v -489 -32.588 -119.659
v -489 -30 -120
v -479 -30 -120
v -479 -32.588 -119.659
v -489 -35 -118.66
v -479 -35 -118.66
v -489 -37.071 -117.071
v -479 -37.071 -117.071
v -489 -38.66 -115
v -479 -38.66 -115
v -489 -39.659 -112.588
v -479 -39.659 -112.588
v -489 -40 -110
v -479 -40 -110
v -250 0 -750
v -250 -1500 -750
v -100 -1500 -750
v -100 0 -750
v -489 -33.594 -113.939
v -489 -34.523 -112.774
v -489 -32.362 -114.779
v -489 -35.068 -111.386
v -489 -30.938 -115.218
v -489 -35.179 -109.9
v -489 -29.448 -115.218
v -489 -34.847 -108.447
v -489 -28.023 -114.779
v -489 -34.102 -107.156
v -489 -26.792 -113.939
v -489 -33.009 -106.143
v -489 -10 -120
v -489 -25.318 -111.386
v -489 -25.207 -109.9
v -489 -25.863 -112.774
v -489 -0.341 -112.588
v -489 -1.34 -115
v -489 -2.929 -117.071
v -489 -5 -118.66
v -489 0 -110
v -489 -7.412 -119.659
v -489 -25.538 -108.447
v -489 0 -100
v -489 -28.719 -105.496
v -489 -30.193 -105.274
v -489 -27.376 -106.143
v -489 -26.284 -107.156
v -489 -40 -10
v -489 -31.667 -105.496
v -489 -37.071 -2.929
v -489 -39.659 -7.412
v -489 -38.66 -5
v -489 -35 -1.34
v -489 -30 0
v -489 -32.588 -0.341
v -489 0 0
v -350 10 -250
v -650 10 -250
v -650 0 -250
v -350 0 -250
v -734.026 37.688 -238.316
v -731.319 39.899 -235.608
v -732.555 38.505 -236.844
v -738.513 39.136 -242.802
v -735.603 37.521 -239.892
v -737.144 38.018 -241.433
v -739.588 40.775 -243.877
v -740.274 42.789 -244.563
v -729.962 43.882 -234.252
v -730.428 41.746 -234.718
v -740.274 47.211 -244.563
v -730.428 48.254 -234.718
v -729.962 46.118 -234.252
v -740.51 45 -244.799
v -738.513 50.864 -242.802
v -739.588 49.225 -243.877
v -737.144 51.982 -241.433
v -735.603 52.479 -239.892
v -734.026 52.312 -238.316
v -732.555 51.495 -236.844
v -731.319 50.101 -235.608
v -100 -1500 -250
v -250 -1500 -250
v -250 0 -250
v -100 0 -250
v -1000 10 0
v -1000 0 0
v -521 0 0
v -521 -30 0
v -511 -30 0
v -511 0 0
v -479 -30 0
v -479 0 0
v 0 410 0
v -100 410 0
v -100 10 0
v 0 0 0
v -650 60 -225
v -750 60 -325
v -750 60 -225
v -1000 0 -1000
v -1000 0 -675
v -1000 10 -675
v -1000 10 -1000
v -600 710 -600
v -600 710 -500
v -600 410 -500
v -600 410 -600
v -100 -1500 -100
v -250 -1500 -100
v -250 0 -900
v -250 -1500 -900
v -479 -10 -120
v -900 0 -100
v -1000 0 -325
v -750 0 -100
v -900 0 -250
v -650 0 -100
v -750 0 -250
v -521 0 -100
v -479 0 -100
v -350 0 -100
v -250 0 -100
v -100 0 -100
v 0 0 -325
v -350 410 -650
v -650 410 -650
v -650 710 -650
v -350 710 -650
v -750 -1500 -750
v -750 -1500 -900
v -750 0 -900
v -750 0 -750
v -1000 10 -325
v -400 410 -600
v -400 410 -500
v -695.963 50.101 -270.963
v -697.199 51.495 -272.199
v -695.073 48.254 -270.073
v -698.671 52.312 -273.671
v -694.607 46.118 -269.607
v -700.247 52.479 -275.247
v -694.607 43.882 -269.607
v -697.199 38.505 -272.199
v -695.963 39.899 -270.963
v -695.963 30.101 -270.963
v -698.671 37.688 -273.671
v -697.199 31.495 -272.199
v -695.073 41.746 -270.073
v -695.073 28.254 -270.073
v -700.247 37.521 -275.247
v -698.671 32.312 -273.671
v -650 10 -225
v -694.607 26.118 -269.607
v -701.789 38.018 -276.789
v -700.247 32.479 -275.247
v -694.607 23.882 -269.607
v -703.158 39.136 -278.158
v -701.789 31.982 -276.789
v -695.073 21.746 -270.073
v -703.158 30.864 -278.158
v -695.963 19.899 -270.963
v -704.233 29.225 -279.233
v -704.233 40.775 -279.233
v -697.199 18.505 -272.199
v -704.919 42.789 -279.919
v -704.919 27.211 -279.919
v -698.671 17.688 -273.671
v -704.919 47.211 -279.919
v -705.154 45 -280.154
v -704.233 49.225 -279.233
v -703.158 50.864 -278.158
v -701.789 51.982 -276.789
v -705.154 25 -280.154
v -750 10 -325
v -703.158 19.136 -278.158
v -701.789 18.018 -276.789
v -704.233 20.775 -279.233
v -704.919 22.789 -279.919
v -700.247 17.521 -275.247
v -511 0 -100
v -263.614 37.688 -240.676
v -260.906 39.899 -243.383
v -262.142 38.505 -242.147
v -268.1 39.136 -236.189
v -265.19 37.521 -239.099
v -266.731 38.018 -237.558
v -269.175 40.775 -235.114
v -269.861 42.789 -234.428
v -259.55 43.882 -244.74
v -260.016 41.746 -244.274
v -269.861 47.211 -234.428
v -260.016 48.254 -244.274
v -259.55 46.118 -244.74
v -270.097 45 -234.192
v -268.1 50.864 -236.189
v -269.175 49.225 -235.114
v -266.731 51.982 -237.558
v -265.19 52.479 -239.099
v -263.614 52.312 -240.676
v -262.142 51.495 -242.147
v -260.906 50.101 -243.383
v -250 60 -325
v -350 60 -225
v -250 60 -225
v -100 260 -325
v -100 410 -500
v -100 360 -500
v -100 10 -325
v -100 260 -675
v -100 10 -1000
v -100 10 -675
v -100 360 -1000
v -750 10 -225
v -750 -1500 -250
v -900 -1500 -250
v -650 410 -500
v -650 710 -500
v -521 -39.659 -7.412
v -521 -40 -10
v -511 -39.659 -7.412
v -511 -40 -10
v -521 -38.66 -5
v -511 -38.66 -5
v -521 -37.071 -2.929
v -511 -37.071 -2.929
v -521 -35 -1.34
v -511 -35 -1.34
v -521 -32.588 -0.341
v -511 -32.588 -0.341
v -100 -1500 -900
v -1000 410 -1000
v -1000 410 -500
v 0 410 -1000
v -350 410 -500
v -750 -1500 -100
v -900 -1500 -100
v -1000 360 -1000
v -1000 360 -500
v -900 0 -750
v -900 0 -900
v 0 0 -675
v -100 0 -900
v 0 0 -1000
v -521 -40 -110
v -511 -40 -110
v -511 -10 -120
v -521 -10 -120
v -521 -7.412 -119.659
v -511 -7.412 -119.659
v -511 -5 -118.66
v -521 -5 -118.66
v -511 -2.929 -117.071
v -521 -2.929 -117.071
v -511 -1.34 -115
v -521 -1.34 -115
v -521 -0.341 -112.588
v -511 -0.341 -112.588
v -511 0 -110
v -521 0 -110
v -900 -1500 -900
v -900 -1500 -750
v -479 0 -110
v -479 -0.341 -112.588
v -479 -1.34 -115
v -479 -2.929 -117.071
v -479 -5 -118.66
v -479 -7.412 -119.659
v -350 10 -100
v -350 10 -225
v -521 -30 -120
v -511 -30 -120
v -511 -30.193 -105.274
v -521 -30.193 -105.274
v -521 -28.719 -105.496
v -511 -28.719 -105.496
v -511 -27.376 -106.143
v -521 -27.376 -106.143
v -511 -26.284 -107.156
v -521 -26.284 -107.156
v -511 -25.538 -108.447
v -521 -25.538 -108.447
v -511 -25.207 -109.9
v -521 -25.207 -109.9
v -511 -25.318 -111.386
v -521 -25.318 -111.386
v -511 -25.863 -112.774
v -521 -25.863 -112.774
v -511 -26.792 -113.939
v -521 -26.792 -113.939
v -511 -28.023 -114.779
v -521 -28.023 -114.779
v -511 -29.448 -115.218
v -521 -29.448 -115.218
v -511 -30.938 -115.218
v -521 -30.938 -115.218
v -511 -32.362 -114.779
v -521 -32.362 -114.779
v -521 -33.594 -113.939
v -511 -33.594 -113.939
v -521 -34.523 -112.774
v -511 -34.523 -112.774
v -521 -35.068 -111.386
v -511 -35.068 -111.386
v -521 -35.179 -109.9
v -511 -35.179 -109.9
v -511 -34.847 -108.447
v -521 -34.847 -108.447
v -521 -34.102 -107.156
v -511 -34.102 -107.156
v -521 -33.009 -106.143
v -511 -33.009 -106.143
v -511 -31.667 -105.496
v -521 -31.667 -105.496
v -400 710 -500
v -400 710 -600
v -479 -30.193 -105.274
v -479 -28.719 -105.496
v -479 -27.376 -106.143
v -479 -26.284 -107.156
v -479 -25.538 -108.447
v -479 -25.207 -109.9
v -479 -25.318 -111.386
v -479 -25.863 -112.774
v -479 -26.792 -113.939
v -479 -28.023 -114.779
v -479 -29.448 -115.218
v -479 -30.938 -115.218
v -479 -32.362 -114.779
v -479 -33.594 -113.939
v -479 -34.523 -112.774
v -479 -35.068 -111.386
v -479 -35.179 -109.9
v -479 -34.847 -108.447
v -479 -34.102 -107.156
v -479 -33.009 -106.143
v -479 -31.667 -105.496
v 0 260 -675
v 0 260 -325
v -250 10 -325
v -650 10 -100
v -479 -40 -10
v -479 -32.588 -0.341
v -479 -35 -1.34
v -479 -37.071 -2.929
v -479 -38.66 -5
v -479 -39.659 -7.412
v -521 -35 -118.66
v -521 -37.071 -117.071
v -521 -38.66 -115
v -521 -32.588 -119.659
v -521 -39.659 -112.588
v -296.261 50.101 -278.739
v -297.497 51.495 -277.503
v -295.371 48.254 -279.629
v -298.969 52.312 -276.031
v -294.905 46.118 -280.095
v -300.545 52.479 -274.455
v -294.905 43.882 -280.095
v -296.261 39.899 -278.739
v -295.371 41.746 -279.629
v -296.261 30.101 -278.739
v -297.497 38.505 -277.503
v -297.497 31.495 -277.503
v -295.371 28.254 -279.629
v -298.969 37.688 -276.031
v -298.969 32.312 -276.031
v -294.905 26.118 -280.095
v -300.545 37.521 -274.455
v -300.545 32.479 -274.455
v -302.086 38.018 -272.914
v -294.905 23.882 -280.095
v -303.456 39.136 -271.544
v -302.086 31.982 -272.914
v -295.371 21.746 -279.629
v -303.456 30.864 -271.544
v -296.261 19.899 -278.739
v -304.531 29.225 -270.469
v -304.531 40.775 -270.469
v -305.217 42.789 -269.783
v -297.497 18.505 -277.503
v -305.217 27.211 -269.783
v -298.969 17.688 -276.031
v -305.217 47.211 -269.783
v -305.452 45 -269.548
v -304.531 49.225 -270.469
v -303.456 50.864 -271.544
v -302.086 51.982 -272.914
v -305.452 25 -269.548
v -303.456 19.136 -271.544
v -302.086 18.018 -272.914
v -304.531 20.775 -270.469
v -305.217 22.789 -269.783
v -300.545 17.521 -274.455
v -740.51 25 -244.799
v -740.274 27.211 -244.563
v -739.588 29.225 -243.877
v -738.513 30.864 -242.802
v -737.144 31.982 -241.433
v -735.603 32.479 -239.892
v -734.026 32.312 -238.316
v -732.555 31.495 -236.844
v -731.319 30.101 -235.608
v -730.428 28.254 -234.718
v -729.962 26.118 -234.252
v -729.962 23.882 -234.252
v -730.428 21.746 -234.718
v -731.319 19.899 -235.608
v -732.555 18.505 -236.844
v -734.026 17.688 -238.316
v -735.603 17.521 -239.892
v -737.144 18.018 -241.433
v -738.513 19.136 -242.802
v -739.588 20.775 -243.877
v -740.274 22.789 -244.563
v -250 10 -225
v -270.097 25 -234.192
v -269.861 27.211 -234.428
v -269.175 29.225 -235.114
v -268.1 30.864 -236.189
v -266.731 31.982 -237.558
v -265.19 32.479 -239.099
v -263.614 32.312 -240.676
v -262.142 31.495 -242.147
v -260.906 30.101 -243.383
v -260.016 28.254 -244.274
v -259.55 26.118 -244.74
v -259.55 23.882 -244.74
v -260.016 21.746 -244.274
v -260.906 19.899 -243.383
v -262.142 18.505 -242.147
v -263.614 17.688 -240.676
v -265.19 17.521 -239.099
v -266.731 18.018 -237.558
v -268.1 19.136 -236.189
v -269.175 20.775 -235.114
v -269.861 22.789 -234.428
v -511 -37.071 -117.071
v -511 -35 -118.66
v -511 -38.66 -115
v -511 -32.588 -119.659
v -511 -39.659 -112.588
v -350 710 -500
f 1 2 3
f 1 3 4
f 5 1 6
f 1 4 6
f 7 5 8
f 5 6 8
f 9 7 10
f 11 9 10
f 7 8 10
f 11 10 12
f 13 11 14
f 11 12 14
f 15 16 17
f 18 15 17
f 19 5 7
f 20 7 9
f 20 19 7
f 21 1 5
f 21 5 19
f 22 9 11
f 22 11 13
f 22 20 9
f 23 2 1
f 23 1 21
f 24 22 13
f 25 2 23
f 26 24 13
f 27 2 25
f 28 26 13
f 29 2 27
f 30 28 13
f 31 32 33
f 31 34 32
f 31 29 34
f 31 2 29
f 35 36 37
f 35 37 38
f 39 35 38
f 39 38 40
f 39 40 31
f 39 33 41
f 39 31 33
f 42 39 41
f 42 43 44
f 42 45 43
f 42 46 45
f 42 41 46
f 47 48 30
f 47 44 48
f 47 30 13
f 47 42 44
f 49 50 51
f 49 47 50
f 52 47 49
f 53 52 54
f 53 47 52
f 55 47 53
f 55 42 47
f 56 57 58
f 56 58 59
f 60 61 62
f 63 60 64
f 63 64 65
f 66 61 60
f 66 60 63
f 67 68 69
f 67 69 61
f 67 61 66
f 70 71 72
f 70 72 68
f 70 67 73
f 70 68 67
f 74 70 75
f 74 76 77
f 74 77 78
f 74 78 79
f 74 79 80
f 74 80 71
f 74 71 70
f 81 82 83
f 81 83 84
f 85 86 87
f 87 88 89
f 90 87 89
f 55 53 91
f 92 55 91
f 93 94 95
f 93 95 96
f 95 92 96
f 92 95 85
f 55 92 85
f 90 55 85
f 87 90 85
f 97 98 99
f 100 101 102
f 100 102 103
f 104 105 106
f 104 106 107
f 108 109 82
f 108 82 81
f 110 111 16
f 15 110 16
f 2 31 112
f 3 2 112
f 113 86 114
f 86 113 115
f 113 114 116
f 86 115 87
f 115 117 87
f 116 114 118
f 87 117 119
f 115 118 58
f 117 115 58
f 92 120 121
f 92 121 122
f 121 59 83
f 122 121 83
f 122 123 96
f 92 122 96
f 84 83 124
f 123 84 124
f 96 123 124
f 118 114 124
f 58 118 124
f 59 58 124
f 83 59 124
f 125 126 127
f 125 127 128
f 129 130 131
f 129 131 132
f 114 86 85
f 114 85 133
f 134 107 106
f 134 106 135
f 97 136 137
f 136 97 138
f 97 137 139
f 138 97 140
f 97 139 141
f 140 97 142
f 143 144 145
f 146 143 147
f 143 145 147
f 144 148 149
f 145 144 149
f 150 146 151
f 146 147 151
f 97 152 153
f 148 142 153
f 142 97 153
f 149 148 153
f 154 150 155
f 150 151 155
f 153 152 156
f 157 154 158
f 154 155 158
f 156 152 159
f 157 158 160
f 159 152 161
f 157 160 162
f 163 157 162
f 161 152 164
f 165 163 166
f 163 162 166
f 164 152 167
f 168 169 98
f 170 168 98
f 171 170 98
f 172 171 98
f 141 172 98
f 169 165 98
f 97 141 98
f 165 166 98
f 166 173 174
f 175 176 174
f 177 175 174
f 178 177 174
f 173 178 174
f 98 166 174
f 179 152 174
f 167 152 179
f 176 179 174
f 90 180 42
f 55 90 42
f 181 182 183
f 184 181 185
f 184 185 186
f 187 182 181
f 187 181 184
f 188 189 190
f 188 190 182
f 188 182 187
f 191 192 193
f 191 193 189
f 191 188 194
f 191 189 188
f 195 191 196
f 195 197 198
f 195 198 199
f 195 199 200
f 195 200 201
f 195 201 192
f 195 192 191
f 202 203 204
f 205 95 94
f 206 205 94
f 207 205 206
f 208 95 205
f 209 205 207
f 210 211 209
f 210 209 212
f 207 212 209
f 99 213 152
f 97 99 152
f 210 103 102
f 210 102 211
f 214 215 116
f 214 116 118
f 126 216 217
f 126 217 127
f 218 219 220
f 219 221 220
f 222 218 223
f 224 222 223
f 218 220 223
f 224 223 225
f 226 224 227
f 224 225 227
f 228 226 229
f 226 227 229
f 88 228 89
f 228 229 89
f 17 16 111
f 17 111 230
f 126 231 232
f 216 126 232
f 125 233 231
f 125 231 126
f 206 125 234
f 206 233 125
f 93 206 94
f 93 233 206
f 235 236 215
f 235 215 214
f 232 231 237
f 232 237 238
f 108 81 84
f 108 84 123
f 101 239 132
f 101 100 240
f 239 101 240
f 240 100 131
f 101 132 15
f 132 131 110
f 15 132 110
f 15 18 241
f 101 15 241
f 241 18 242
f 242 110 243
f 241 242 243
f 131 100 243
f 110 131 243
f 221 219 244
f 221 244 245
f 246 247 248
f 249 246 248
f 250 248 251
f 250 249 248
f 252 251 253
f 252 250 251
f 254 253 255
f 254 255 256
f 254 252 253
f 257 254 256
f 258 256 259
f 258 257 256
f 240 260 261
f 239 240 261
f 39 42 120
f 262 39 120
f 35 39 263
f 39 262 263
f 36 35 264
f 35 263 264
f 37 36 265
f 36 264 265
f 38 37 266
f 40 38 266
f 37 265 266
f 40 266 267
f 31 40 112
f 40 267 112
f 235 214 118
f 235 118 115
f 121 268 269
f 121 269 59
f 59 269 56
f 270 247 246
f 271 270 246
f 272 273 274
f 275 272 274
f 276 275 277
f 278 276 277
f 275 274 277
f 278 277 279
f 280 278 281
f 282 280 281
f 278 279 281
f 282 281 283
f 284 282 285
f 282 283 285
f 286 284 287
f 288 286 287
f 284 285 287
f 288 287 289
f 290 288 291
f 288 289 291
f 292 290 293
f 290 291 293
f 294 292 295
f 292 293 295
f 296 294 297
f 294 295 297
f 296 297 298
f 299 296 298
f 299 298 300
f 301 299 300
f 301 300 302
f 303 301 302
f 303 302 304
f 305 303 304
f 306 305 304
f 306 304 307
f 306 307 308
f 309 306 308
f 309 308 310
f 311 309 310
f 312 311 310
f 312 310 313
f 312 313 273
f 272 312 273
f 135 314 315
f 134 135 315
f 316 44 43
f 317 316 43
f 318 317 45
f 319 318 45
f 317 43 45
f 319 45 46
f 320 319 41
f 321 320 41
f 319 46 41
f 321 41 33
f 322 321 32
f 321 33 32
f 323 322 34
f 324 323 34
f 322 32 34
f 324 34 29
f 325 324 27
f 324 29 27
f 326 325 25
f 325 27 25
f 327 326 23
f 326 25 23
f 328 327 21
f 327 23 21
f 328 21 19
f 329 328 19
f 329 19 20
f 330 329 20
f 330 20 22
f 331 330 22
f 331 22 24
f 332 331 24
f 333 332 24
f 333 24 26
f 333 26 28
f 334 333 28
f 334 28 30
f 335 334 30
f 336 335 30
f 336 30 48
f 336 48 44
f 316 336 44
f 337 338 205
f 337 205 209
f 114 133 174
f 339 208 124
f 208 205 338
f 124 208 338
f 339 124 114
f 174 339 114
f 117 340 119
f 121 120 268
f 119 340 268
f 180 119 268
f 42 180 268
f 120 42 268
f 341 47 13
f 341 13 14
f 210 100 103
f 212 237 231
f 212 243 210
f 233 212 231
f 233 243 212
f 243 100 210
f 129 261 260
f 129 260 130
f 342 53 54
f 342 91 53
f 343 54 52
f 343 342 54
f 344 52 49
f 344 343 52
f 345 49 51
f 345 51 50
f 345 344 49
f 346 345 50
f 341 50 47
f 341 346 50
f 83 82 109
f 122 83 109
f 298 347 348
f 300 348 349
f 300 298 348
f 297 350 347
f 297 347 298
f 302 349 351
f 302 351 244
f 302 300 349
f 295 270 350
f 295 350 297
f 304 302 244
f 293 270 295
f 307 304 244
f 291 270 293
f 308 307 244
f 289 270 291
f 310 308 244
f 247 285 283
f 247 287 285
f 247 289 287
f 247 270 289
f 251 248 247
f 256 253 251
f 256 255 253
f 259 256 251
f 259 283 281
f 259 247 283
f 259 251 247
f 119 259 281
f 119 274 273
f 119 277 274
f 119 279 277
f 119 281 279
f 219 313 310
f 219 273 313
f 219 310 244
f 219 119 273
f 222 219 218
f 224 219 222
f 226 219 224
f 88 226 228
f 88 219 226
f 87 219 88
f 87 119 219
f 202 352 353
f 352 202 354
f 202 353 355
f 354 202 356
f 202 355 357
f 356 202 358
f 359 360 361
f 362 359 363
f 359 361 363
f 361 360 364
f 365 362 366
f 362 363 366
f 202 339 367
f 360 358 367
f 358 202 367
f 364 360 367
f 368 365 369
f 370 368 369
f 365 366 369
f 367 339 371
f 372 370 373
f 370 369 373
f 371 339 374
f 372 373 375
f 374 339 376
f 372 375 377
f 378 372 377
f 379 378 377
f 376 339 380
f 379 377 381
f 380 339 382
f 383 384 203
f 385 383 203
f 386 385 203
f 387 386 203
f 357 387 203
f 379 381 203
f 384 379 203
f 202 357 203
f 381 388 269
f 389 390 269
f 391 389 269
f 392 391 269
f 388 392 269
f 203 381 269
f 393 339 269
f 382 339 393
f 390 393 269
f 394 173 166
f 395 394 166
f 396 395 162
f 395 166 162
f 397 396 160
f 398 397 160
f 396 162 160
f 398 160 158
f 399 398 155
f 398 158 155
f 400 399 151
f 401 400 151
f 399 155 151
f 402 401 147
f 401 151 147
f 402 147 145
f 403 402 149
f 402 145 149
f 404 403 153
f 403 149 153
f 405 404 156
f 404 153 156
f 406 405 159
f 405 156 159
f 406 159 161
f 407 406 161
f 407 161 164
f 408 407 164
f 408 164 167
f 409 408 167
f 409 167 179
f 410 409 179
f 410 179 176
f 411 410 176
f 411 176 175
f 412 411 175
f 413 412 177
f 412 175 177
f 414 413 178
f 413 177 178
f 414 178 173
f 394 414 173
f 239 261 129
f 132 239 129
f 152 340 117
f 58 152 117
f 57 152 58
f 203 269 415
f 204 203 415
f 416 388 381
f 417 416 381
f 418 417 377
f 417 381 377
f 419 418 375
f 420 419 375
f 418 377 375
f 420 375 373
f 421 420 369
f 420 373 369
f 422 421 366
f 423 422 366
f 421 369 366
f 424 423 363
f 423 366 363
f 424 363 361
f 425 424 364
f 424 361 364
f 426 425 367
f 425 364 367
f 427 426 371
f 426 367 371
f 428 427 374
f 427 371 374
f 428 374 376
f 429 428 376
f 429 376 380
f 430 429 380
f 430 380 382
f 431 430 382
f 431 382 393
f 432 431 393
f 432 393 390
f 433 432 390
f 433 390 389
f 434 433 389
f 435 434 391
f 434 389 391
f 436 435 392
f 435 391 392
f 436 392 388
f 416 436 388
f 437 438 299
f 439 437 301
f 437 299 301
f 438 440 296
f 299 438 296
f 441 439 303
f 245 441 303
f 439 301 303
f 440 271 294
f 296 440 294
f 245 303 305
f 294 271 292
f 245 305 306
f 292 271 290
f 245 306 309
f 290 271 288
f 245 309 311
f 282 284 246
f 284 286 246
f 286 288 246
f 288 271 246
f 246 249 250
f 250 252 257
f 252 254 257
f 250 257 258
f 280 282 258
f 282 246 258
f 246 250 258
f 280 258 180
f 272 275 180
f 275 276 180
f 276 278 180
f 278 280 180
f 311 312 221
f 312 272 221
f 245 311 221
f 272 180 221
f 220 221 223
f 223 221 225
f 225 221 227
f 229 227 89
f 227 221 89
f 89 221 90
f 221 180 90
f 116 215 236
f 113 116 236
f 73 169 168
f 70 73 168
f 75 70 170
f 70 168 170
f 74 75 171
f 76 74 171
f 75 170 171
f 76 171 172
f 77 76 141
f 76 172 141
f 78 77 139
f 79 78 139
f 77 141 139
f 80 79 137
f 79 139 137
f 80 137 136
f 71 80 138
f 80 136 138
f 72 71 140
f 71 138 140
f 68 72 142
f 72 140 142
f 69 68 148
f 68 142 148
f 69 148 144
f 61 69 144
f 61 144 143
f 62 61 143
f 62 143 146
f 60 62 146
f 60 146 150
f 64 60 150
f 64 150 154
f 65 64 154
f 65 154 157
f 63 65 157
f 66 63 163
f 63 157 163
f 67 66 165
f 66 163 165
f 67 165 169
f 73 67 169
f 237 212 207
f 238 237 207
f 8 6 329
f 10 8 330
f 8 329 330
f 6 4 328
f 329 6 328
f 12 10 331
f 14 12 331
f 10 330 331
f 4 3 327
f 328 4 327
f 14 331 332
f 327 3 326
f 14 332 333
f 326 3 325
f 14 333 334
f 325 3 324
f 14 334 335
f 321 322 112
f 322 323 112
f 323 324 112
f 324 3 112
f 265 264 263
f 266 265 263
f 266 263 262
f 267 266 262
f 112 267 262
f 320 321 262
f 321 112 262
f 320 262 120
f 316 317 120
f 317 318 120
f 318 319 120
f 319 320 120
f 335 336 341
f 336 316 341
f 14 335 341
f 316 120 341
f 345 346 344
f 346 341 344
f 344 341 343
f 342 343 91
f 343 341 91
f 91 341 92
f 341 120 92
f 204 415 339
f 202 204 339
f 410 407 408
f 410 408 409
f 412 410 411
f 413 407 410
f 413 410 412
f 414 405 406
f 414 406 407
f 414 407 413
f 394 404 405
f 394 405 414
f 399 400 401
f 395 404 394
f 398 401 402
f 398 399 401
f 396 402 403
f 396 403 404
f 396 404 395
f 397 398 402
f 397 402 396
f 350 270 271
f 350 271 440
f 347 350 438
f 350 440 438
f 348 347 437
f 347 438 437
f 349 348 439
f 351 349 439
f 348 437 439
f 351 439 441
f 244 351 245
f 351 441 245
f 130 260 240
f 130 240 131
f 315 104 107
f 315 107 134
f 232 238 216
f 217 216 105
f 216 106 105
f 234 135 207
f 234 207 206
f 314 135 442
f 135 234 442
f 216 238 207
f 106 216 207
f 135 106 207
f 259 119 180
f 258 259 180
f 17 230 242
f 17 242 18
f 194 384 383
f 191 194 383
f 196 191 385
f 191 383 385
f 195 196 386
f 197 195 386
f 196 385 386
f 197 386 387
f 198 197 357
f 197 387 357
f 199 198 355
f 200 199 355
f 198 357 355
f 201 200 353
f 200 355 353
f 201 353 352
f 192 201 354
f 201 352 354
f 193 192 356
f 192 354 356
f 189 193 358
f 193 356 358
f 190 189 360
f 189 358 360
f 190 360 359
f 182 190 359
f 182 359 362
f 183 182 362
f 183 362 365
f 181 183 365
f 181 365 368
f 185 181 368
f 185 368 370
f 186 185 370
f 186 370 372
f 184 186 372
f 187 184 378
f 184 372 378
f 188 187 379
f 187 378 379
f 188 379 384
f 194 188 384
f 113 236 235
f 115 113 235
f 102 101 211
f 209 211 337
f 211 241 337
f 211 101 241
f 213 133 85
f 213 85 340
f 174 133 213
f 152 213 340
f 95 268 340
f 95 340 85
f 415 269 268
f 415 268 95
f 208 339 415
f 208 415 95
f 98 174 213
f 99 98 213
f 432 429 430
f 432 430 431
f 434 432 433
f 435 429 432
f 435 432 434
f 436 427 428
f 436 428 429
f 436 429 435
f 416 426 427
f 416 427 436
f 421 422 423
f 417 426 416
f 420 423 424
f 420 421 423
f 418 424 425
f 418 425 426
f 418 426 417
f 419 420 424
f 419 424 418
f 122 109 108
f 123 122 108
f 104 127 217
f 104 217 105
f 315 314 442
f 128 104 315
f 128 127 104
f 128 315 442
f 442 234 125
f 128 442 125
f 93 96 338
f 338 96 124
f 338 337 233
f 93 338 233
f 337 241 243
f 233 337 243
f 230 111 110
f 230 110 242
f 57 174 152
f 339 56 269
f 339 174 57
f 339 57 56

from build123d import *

# Parameters (mm, degrees)
SKETCH1_W           = 1000
SKETCH1_H           = 1000
BOSS_EXTRUDE1_DEPTH = 10
SKETCH5_W           = 150
SKETCH5_H           = 150
BOSS_EXTRUDE2_DEPTH = 1500
SKETCH7_W           = 300
SKETCH7_H           = 150
CUT_EXTRUDE1_DEPTH  = 1500
SKETCH9_W           = 10
SKETCH9_H           = 120
BOSS_EXTRUDE4_DEPTH = 40
FILLET1_R           = 10
FILLET2_R           = 10
SKETCH10_R          = 5
CUT_EXTRUDE3_DEPTH  = 55
SKETCH11_W          = 100
SKETCH11_H          = 1000
BOSS_EXTRUDE5_DEPTH = 400
SKETCH12_W          = 500
SKETCH12_H          = 50
BOSS_EXTRUDE6_DEPTH = 900
SKETCH14_W          = 300
SKETCH14_H          = 150
BOSS_EXTRUDE7_DEPTH = 300
SKETCH15_W          = 200
SKETCH15_H          = 100
CUT_EXTRUDE4_DEPTH  = 300
SKETCH8_W           = 1000
SKETCH8_H           = 350
CUT_EXTRUDE2_DEPTH  = 2069.840254829
SKETCH16_W          = 350
SKETCH16_H          = 250
CUT_EXTRUDE5_DEPTH  = 2062.552812809
BOSS_EXTRUDE8_DEPTH = 50
SKETCH21_R          = 7.5
CUT_EXTRUDE7_DEPTH  = 50
SKETCH22_R          = 7.5
CUT_EXTRUDE8_DEPTH  = 50


with BuildPart() as part:
    # Sketch1 → Boss-Extrude1 (new body)
    with BuildSketch(Plane(origin=(0, 0, 0), x_dir=(1, 0, 0), z_dir=(0, 1, 0))):
        with Locations((-500, 500)):
            Rectangle(SKETCH1_W, SKETCH1_H)
    extrude(amount=BOSS_EXTRUDE1_DEPTH)

    # Sketch5 → Boss-Extrude2 (add)
    with BuildSketch(Plane.XZ):
        with Locations((-825, -825)):
            Rectangle(SKETCH5_W, SKETCH5_H)
        with Locations((-825, -175)):
            Rectangle(SKETCH5_W, SKETCH5_H)
        with Locations((-175, -825)):
            Rectangle(SKETCH5_W, SKETCH5_H)
        with Locations((-175, -175)):
            Rectangle(SKETCH5_W, SKETCH5_H)
    extrude(amount=BOSS_EXTRUDE2_DEPTH)

    # Sketch7 → Cut-Extrude1 (cut)
    with BuildSketch(Plane(origin=(0, 10, 0), x_dir=(1, 0, 0), z_dir=(0, 1, 0))):
        with Locations((-500, 175)):
            Rectangle(SKETCH7_W, SKETCH7_H)
    extrude(amount=-CUT_EXTRUDE1_DEPTH, mode=Mode.SUBTRACT)

    # Sketch9 → Boss-Extrude4 (add)
    with BuildSketch(Plane.XZ):
        with Locations((-516, -60)):
            Rectangle(SKETCH9_W, SKETCH9_H)
        with Locations((-484, -60)):
            Rectangle(SKETCH9_W, SKETCH9_H)
    extrude(amount=BOSS_EXTRUDE4_DEPTH)

    # Fillet1
    fillet1_edges = [part.edges().sort_by_distance(p)[0] for p in [
        (-516, 0, -120),
        (-516, -40, -120),
        (-484, 0, -120),
        (-484, -40, -120),
    ]]
    fillet(fillet1_edges, radius=FILLET1_R)

    # Fillet2
    fillet2_edges = [part.edges().sort_by_distance(p)[0] for p in [
        (-516, -40, 0),
        (-484, -40, 0),
    ]]
    fillet(fillet2_edges, radius=FILLET2_R)

    # Sketch10 → Cut-Extrude3 (cut)
    with BuildSketch(Plane.ZY.offset(521)):
        with Locations((-110.273760932, -30.192862472)):
            Circle(SKETCH10_R)
    extrude(amount=-CUT_EXTRUDE3_DEPTH, mode=Mode.SUBTRACT)

    # Sketch11 → Boss-Extrude5 (add)
    with BuildSketch(Plane(origin=(0, 10, 0), x_dir=(1, 0, 0), z_dir=(0, 1, 0))):
        with Locations((-50, 500)):
            Rectangle(SKETCH11_W, SKETCH11_H)
    extrude(amount=BOSS_EXTRUDE5_DEPTH)

    # Sketch12 → Boss-Extrude6 (add)
    with BuildSketch(Plane.ZY.offset(100)):
        with Locations((-750, 385)):
            Rectangle(SKETCH12_W, SKETCH12_H)
    extrude(amount=BOSS_EXTRUDE6_DEPTH)

    # Sketch14 → Boss-Extrude7 (add)
    with BuildSketch(Plane(origin=(0, 410, 0), x_dir=(1, 0, 0), z_dir=(0, 1, 0))):
        with Locations((-500, 575)):
            Rectangle(SKETCH14_W, SKETCH14_H)
    extrude(amount=BOSS_EXTRUDE7_DEPTH)

    # Sketch15 → Cut-Extrude4 (cut)
    with BuildSketch(Plane(origin=(0, 710, 0), x_dir=(1, 0, 0), z_dir=(0, 1, 0))):
        with Locations((-500, 550)):
            Rectangle(SKETCH15_W, SKETCH15_H)
    extrude(amount=-CUT_EXTRUDE4_DEPTH, mode=Mode.SUBTRACT)

    # Sketch8 → Cut-Extrude2 (cut, through all)
    with BuildSketch(Plane(origin=(0, 10, 0), x_dir=(1, 0, 0), z_dir=(0, 1, 0))):
        with Locations((-500, 500)):
            Rectangle(SKETCH8_W, SKETCH8_H)
    extrude(amount=-CUT_EXTRUDE2_DEPTH, mode=Mode.SUBTRACT)

    # Sketch16 → Cut-Extrude5 (cut, through all)
    with BuildSketch(Plane(origin=(0, 0, 0), x_dir=(0, 0, -1), z_dir=(1, 0, 0))):
        with Locations((500, 135)):
            Rectangle(SKETCH16_W, SKETCH16_H)
    extrude(amount=-CUT_EXTRUDE5_DEPTH, mode=Mode.SUBTRACT)

    # Sketch18 → Boss-Extrude8 (add)
    with BuildSketch(Plane(origin=(0, 10, 0), x_dir=(1, 0, 0), z_dir=(0, 1, 0))):
        Polygon((-750, 325), (-750, 225), (-650, 225), align=None)
        Polygon((-350, 225), (-250, 225), (-250, 325), align=None)
    extrude(amount=BOSS_EXTRUDE8_DEPTH)

    # Sketch21 → Cut-Extrude7 (cut)
    with BuildSketch(Plane(origin=(-287.5, 0, -287.5), x_dir=(-0.7071067811865475, 0, 0.7071067811865477), z_dir=(-0.7071067811865477, 0, -0.7071067811865475))):
        with Locations((17.888347648, 45)):
            Circle(SKETCH21_R)
        with Locations((17.888347648, 25)):
            Circle(SKETCH21_R)
    extrude(amount=-CUT_EXTRUDE7_DEPTH, mode=Mode.SUBTRACT)

    # Sketch22 → Cut-Extrude8 (cut)
    with BuildSketch(Plane(origin=(-212.5, 0, 212.5), x_dir=(-0.7071067811865474, 0, -0.7071067811865477), z_dir=(0.7071067811865477, 0, -0.7071067811865474))):
        with Locations((689.218433538, 45)):
            Circle(SKETCH22_R)
        with Locations((689.218433538, 25)):
            Circle(SKETCH22_R)
    extrude(amount=-CUT_EXTRUDE8_DEPTH, mode=Mode.SUBTRACT)


solid = part.part
